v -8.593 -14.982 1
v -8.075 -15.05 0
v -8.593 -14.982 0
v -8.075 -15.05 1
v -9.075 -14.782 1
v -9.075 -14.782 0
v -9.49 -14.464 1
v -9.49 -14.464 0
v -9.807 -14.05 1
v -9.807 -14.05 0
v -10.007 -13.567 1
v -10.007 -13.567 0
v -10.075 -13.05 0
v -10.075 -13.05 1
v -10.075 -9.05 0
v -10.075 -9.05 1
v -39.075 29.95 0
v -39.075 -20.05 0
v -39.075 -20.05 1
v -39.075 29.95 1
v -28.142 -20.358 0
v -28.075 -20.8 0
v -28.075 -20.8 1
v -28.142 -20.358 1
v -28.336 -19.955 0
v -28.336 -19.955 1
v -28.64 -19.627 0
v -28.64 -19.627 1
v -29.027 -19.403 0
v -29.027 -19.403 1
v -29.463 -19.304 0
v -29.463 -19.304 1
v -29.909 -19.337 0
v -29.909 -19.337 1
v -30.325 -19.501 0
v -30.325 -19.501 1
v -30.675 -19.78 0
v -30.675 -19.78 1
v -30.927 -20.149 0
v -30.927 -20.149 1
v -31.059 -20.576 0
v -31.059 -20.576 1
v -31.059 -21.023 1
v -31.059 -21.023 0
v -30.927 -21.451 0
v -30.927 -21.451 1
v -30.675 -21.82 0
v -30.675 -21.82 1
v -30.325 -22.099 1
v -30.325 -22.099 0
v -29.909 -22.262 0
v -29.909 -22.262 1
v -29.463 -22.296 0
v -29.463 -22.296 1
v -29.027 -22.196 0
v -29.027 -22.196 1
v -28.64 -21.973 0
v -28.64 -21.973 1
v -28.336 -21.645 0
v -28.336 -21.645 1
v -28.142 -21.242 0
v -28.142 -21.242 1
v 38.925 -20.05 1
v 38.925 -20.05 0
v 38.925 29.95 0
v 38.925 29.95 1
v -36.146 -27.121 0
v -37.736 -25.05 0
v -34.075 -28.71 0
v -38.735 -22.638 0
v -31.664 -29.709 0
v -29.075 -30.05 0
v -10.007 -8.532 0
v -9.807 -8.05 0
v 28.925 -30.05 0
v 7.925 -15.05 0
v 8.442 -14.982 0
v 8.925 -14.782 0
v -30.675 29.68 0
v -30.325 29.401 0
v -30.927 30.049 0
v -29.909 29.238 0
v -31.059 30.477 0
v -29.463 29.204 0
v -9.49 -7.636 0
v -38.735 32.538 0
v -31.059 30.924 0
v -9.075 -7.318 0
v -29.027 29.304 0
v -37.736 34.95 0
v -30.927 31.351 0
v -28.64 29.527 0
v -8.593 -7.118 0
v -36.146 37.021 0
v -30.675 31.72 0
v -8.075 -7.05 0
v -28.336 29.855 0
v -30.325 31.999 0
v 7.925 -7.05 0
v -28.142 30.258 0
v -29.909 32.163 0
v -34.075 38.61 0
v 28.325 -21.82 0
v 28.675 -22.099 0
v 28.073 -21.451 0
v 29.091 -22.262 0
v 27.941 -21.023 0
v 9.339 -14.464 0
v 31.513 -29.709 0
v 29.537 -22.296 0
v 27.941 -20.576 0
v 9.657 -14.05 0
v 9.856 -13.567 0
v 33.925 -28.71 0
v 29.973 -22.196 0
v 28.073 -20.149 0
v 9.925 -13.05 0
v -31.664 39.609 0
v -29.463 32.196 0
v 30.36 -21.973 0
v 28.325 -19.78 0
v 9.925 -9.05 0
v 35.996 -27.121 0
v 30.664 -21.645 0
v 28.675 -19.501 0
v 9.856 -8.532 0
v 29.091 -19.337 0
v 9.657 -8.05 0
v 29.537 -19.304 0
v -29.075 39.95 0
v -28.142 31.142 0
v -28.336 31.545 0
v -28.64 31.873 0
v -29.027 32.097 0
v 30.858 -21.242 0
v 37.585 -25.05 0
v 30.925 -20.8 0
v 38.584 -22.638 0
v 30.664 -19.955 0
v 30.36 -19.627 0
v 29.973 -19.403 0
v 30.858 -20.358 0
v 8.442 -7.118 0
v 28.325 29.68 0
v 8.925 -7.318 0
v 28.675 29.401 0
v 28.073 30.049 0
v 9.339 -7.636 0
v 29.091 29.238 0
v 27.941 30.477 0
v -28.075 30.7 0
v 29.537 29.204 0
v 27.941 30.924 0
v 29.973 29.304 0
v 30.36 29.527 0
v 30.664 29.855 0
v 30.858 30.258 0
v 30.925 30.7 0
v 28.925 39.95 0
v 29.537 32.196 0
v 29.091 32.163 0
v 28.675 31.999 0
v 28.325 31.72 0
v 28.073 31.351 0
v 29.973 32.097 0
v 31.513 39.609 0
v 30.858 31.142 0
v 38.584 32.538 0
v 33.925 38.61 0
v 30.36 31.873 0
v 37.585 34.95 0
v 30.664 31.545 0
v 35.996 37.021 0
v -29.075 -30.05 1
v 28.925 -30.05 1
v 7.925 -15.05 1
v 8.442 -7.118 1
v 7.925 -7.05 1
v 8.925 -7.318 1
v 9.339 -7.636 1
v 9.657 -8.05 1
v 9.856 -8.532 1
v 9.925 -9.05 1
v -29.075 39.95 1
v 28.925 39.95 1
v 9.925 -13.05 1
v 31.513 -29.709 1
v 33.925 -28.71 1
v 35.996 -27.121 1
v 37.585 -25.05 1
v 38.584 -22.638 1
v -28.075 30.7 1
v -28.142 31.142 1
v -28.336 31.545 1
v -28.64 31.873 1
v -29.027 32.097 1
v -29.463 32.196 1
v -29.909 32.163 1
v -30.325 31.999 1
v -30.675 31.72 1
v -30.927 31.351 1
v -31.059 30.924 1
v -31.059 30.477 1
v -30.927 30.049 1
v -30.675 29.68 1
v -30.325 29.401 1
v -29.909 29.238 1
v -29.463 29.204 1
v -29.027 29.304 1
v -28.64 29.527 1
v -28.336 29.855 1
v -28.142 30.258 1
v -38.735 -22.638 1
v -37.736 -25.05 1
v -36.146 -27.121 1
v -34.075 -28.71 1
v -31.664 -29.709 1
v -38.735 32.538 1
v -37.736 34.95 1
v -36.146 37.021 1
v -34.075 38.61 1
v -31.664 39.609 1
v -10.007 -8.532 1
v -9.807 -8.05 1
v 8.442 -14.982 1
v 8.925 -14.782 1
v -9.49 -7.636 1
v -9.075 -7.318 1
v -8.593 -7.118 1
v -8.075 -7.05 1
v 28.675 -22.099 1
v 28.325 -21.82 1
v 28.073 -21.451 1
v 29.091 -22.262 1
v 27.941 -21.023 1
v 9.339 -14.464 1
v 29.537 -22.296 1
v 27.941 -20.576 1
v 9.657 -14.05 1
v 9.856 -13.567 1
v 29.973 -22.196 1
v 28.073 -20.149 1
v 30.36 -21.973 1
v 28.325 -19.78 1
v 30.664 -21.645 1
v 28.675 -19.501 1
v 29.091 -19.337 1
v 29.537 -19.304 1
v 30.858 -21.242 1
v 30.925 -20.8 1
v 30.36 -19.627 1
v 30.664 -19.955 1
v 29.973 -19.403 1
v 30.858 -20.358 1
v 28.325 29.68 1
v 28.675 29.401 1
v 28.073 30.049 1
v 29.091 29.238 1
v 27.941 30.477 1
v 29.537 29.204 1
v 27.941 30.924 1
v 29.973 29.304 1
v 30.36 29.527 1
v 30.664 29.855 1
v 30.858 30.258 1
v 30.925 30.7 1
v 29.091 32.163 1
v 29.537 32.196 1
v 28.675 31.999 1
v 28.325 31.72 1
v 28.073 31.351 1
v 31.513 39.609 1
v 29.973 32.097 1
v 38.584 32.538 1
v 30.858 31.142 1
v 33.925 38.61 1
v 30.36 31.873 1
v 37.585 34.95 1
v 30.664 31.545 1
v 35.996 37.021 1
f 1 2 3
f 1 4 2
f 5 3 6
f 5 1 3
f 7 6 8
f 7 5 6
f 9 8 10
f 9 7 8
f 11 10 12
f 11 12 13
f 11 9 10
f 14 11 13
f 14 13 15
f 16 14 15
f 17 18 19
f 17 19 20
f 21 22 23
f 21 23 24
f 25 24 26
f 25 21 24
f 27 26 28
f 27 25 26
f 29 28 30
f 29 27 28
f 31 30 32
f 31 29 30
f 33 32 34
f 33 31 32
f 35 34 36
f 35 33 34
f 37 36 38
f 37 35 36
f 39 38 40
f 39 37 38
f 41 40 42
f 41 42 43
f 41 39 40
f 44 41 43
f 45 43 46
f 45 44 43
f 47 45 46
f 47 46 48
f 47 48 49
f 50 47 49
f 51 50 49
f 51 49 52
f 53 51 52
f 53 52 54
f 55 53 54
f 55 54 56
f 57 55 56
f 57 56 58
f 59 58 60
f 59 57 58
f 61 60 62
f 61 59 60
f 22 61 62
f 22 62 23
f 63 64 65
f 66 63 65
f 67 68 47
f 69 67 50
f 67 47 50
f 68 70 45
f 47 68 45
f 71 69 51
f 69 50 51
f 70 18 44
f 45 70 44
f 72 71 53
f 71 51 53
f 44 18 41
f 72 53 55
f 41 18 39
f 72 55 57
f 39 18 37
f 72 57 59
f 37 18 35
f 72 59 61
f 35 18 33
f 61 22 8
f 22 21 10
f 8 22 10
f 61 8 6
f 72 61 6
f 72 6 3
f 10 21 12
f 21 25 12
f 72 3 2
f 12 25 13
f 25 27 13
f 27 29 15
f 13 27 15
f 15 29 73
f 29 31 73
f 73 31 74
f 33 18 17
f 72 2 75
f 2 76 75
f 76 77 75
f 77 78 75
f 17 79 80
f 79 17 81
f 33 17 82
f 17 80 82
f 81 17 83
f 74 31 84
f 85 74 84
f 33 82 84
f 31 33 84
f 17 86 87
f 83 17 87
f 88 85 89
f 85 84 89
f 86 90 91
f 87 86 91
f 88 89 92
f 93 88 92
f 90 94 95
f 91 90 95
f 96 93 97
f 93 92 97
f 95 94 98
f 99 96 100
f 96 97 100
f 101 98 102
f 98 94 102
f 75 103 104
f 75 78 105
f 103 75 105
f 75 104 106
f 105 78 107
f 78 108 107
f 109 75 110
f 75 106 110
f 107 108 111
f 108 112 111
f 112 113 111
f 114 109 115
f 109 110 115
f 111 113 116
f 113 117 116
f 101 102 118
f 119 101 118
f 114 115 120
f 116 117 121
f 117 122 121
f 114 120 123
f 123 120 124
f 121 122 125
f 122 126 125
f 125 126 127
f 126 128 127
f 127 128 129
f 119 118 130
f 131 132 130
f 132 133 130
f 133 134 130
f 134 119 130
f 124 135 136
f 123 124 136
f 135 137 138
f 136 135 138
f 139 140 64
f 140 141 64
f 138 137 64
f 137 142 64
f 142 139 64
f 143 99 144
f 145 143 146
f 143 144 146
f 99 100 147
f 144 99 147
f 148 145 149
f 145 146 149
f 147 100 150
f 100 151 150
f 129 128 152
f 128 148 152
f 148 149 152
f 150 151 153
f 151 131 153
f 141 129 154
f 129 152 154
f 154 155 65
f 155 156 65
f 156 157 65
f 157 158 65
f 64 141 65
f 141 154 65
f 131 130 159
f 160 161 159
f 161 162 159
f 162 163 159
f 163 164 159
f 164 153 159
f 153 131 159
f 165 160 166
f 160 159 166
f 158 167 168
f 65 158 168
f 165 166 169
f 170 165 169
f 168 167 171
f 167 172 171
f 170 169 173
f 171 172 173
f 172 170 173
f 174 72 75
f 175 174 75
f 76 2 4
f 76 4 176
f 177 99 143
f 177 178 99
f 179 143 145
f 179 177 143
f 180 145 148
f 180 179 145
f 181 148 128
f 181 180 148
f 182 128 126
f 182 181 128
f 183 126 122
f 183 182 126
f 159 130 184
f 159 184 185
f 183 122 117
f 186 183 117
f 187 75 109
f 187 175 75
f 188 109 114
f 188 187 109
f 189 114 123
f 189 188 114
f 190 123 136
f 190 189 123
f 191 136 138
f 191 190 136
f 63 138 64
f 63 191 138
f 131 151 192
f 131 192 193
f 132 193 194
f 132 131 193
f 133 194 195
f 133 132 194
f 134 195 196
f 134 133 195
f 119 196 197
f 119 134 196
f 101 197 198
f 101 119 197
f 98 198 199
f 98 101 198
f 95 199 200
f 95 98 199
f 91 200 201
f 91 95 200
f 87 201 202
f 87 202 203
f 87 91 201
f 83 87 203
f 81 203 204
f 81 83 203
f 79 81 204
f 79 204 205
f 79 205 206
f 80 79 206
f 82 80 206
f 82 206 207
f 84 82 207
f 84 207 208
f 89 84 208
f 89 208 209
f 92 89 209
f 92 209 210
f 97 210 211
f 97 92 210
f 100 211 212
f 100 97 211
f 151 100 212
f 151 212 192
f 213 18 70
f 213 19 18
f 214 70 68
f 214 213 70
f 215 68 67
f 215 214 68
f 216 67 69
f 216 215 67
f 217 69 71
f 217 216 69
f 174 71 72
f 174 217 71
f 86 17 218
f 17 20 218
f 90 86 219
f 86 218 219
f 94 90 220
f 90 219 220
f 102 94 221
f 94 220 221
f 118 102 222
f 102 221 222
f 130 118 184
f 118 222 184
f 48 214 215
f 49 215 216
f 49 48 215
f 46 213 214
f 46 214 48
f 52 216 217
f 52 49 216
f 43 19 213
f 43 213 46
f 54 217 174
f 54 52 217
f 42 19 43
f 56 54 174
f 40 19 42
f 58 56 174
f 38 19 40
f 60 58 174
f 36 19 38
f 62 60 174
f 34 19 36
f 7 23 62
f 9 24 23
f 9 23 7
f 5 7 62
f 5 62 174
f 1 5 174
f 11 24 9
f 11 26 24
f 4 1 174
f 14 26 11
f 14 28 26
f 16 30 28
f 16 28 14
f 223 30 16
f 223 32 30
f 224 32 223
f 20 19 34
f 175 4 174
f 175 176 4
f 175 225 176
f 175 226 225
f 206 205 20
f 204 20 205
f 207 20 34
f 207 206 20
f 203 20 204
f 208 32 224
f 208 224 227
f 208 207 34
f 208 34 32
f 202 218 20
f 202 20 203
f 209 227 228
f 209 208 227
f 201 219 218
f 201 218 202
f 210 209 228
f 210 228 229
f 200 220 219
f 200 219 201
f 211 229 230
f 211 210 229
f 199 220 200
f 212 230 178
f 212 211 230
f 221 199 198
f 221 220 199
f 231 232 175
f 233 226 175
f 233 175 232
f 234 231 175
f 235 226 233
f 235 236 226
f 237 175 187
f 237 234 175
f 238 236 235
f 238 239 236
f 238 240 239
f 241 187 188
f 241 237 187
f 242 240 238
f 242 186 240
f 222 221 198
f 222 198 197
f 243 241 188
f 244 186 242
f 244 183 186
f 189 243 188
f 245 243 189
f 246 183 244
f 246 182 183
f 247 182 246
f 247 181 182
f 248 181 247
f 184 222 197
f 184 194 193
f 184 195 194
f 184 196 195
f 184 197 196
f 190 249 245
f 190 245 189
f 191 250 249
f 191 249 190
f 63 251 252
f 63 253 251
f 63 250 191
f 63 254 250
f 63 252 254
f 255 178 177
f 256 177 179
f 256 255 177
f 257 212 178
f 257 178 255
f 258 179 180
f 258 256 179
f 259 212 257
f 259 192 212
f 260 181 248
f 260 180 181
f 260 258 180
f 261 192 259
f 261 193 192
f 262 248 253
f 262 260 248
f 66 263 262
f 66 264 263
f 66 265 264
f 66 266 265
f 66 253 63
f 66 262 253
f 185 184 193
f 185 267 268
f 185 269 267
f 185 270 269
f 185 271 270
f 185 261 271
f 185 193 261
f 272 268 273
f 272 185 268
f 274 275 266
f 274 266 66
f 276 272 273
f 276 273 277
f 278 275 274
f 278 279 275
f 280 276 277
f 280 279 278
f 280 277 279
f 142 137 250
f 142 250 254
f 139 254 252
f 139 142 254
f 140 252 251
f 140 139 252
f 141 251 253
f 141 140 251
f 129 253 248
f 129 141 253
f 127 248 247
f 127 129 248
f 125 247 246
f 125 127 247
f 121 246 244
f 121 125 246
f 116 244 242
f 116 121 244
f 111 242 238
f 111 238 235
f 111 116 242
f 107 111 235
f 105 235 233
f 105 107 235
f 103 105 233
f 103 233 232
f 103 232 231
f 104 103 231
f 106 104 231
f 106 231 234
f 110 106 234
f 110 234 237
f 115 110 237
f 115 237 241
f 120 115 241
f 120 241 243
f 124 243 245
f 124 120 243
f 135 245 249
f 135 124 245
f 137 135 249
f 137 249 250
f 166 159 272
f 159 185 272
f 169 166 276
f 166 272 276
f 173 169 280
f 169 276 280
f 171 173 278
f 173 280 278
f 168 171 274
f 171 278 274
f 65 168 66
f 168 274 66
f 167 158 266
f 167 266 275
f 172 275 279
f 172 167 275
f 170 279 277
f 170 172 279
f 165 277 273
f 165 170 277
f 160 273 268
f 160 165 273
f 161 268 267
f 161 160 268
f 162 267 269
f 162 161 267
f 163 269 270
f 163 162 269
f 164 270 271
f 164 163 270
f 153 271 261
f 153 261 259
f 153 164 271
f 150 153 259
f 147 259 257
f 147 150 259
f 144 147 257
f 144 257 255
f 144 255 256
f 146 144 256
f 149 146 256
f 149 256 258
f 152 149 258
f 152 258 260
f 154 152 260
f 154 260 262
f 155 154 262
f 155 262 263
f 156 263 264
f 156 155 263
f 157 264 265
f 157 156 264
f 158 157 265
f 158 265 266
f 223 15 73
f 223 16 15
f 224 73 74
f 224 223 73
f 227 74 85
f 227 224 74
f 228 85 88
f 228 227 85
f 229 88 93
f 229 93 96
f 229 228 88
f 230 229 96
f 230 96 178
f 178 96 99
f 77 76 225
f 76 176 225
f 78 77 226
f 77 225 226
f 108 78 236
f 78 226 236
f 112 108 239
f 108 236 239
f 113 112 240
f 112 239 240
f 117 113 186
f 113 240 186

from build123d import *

# Parameters (mm, degrees)
SKETCH1_W           = 78
SKETCH1_H           = 70
SKETCH1_W_2         = 48
SKETCH1_H_2         = 40
SKETCH1_W_3         = 5
SKETCH1_H_3         = 6.5
SKETCH1_R           = 1.5
BOSS_EXTRUDE2_DEPTH = 1
FILLET2_R           = 10
FILLET3_R           = 2


with BuildPart() as part:
    # Sketch1 → Boss-Extrude2 (new body)
    # profile 1 of 6: a face of its own
    with BuildSketch(Plane.XY):
        with Locations((-0.075399098, 4.950190099)):
            Rectangle(SKETCH1_W, SKETCH1_H)
        with Locations((-0.075399098, 4.950190099)):
            Rectangle(SKETCH1_W_2, SKETCH1_H_2, mode=Mode.SUBTRACT)
        with Locations((-29.575399098, -20.799809901)):
            Rectangle(SKETCH1_W_3, SKETCH1_H_3, mode=Mode.SUBTRACT)
        with Locations((-29.575399098, 30.700190099)):
            Rectangle(SKETCH1_W_3, SKETCH1_H_3, mode=Mode.SUBTRACT)
        with Locations((29.424600902, 30.700190099)):
            Rectangle(SKETCH1_W_3, SKETCH1_H_3, mode=Mode.SUBTRACT)
        with Locations((29.424600902, -20.799809901)):
            Rectangle(SKETCH1_W_3, SKETCH1_H_3, mode=Mode.SUBTRACT)
    # profile 2 of 6: a face of its own
    with BuildSketch(Plane.XY):
        with Locations((29.424600902, -20.799809901)):
            Rectangle(SKETCH1_W_3, SKETCH1_H_3)
        with Locations((29.424600902, -20.799809901)):
            Circle(SKETCH1_R, mode=Mode.SUBTRACT)
    # profile 3 of 6: a face of its own
    with BuildSketch(Plane.XY):
        with Locations((-29.575399098, -20.799809901)):
            Rectangle(SKETCH1_W_3, SKETCH1_H_3)
        with Locations((-29.575399098, -20.799809901)):
            Circle(SKETCH1_R, mode=Mode.SUBTRACT)
    # profile 4 of 6: a face of its own
    with BuildSketch(Plane.XY):
        with Locations((29.424600902, 30.700190099)):
            Rectangle(SKETCH1_W_3, SKETCH1_H_3)
        with Locations((29.424600902, 30.700190099)):
            Circle(SKETCH1_R, mode=Mode.SUBTRACT)
    # profile 5 of 6: a face of its own
    with BuildSketch(Plane.XY):
        Polygon((23.924600902, 24.950190099), (-24.075399098, 24.950190099), (-24.075399098, -15.049809901), (-10.075399098, -15.049809901), (-10.075399098, -7.049809901), (9.924600902, -7.049809901), (9.924600902, -15.049809901), (23.924600902, -15.049809901), align=None)
    # profile 6 of 6: a face of its own
    with BuildSketch(Plane.XY):
        with Locations((-29.575399098, 30.700190099)):
            Rectangle(SKETCH1_W_3, SKETCH1_H_3)
        with Locations((-29.575399098, 30.700190099)):
            Circle(SKETCH1_R, mode=Mode.SUBTRACT)
    extrude(amount=BOSS_EXTRUDE2_DEPTH)

    # Fillet2
    fillet2_edges = [part.edges().sort_by_distance(p)[0] for p in [
        (38.924600902, -30.049809901, 0.5),
        (-39.075399098, -30.049809901, 0.5),
        (-39.075399098, 39.950190099, 0.5),
        (38.924600902, 39.950190099, 0.5),
    ]]
    fillet(fillet2_edges, radius=FILLET2_R)

    # Fillet3
    fillet3_edges = [part.edges().sort_by_distance(p)[0] for p in [
        (9.924600902, -15.049809901, 0.5),
        (9.924600902, -7.049809901, 0.5),
        (-10.075399098, -7.049809901, 0.5),
        (-10.075399098, -15.049809901, 0.5),
    ]]
    fillet(fillet3_edges, radius=FILLET3_R)


solid = part.part
